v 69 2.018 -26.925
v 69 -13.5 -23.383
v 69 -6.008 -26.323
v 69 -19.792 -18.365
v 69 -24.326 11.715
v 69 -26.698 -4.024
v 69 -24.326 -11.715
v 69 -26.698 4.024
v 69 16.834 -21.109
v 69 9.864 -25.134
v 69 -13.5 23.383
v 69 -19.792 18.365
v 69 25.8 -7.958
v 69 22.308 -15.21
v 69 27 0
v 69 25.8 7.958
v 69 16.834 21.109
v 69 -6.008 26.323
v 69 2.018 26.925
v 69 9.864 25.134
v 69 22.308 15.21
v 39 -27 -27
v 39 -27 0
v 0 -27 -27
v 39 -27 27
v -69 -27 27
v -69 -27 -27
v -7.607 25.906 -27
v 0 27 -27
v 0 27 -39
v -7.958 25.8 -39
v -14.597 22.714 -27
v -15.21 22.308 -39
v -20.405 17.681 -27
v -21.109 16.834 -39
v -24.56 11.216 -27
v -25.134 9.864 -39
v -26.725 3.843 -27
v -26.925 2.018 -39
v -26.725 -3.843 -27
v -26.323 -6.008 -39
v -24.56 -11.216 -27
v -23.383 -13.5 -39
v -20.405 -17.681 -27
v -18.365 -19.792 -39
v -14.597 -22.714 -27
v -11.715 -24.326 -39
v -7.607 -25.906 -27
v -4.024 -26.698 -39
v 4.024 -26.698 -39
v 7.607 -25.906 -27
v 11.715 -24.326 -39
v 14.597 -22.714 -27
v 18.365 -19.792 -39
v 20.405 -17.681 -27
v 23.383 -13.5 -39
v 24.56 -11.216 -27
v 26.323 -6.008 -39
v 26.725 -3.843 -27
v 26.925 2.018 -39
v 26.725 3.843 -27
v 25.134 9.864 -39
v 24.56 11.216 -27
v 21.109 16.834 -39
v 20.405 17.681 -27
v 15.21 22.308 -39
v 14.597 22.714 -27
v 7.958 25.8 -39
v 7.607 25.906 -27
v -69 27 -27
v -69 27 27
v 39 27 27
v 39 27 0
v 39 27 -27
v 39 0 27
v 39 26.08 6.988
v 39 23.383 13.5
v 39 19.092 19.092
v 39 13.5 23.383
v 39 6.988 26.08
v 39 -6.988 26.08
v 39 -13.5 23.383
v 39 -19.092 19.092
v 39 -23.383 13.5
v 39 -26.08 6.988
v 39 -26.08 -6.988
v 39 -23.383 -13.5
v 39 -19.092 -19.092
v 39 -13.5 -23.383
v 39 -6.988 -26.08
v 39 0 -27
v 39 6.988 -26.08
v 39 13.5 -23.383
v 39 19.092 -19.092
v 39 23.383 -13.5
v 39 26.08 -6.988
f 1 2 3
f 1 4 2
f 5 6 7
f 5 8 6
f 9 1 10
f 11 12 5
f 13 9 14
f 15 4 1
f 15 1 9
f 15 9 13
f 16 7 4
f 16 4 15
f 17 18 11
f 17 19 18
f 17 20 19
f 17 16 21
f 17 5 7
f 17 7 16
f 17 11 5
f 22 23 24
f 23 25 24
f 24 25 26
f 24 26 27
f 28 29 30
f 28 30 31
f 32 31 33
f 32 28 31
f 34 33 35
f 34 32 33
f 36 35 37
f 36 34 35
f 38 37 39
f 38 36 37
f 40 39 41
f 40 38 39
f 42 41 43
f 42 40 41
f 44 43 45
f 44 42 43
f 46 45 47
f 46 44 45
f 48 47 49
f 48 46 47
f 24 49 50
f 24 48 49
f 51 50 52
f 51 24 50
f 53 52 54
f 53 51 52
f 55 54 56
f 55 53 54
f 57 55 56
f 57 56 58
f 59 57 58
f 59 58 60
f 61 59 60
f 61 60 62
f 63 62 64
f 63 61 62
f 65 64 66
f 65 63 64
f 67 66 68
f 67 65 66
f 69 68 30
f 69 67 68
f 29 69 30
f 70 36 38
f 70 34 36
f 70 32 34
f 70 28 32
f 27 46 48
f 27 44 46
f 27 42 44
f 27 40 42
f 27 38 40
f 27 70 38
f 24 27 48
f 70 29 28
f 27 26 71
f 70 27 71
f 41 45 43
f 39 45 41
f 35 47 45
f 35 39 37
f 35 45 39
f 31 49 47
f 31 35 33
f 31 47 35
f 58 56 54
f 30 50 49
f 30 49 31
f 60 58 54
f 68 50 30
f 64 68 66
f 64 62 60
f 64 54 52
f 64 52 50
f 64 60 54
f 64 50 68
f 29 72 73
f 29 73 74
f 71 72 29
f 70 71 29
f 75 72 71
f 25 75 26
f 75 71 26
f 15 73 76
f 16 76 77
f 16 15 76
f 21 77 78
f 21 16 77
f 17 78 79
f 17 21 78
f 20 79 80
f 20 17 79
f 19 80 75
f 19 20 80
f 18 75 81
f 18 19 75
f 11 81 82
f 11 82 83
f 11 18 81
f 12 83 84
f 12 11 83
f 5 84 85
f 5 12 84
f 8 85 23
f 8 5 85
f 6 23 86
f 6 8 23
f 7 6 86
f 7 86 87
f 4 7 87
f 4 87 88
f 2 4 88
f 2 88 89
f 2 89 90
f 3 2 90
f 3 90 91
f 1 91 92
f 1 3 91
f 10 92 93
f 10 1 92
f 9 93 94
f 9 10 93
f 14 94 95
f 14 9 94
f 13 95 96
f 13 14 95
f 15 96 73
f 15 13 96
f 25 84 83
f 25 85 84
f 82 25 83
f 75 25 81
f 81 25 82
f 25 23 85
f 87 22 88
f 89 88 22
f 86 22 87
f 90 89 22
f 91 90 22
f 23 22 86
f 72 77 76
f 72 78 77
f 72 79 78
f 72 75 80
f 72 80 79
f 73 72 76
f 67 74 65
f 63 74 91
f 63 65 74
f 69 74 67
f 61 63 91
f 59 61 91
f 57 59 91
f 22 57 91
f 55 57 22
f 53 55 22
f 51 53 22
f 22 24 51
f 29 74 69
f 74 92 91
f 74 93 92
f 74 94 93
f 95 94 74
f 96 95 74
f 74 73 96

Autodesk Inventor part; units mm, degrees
ref_plane "YZ Plane" through (0, 0, 0) normal (1, 0, 0) x (0, 1, 0)
ref_plane "XZ Plane" through (0, 0, 0) normal (0, 1, 0) x (-1, 0, 0)
ref_plane "XY Plane" through (0, 0, 0) normal (0, 0, 1) x (1, 0, 0)
sketch "Sketch1" plane through (0, 0, 0) normal (0, 0, 1) x (1, 0, 0)
  line L0 (0, 0) -> (27, 0) construction
  line L1 (27, 0) -> (27, 27)
  line L2 (27, 27) -> (0, 27)
  line L3 (0, 27) -> (0, 0) construction
  line L4 (-27, 0) -> (-27, 27)
  line L5 (-27, 27) -> (0, 27)
  line L6 (27, 0) -> (27, -27)
  line L7 (27, -27) -> (0, -27)
  line L8 (-27, -27) -> (0, -27)
  line L9 (-27, 0) -> (-27, -27)
  dimension "d0" = 27
extrude "Extrusion1" add sketch "Sketch1" along normal mid plane 138
sketch "Sketch2" plane through (0, 0, 69) normal (0, 0, 1) x (1, 0, 0)
  line L0 (27, -27) -> (27, 27) projected
  line L1 (27, 27) -> (-27, 27) projected
  line L2 (-27, 27) -> (-27, -27) projected
  line L3 (-27, -27) -> (27, -27) projected
  circle A0 centre (0, 0) radius 27
extrude "Extrusion2" cut sketch "Sketch2" against normal blind 30 contours L3 A0 L0 | A0 L1 L0 | L3 L2 A0 | A0 L2 L1
sketch "Sketch3" plane through (-27, -27, -69) normal (0, -1, 0) x (1, 0, 0)
  line L0 (54, 108) -> (54, 0) projected
  circle A0 centre (27, 69) radius 27
extrude "Extrusion3" add sketch "Sketch3" along normal blind 12
move or copy body "Move Body1" bodies to move or copy 1 copy no rotation origin (0, 0, 0) rotation axis (1, 0, 0) rotation angle 90
move or copy body "Move Body2" bodies to move or copy 1 copy no rotation origin (0, 0, 0) rotation axis (0, 0, 1) rotation angle 90
properties part number "Sholder_Roll"
